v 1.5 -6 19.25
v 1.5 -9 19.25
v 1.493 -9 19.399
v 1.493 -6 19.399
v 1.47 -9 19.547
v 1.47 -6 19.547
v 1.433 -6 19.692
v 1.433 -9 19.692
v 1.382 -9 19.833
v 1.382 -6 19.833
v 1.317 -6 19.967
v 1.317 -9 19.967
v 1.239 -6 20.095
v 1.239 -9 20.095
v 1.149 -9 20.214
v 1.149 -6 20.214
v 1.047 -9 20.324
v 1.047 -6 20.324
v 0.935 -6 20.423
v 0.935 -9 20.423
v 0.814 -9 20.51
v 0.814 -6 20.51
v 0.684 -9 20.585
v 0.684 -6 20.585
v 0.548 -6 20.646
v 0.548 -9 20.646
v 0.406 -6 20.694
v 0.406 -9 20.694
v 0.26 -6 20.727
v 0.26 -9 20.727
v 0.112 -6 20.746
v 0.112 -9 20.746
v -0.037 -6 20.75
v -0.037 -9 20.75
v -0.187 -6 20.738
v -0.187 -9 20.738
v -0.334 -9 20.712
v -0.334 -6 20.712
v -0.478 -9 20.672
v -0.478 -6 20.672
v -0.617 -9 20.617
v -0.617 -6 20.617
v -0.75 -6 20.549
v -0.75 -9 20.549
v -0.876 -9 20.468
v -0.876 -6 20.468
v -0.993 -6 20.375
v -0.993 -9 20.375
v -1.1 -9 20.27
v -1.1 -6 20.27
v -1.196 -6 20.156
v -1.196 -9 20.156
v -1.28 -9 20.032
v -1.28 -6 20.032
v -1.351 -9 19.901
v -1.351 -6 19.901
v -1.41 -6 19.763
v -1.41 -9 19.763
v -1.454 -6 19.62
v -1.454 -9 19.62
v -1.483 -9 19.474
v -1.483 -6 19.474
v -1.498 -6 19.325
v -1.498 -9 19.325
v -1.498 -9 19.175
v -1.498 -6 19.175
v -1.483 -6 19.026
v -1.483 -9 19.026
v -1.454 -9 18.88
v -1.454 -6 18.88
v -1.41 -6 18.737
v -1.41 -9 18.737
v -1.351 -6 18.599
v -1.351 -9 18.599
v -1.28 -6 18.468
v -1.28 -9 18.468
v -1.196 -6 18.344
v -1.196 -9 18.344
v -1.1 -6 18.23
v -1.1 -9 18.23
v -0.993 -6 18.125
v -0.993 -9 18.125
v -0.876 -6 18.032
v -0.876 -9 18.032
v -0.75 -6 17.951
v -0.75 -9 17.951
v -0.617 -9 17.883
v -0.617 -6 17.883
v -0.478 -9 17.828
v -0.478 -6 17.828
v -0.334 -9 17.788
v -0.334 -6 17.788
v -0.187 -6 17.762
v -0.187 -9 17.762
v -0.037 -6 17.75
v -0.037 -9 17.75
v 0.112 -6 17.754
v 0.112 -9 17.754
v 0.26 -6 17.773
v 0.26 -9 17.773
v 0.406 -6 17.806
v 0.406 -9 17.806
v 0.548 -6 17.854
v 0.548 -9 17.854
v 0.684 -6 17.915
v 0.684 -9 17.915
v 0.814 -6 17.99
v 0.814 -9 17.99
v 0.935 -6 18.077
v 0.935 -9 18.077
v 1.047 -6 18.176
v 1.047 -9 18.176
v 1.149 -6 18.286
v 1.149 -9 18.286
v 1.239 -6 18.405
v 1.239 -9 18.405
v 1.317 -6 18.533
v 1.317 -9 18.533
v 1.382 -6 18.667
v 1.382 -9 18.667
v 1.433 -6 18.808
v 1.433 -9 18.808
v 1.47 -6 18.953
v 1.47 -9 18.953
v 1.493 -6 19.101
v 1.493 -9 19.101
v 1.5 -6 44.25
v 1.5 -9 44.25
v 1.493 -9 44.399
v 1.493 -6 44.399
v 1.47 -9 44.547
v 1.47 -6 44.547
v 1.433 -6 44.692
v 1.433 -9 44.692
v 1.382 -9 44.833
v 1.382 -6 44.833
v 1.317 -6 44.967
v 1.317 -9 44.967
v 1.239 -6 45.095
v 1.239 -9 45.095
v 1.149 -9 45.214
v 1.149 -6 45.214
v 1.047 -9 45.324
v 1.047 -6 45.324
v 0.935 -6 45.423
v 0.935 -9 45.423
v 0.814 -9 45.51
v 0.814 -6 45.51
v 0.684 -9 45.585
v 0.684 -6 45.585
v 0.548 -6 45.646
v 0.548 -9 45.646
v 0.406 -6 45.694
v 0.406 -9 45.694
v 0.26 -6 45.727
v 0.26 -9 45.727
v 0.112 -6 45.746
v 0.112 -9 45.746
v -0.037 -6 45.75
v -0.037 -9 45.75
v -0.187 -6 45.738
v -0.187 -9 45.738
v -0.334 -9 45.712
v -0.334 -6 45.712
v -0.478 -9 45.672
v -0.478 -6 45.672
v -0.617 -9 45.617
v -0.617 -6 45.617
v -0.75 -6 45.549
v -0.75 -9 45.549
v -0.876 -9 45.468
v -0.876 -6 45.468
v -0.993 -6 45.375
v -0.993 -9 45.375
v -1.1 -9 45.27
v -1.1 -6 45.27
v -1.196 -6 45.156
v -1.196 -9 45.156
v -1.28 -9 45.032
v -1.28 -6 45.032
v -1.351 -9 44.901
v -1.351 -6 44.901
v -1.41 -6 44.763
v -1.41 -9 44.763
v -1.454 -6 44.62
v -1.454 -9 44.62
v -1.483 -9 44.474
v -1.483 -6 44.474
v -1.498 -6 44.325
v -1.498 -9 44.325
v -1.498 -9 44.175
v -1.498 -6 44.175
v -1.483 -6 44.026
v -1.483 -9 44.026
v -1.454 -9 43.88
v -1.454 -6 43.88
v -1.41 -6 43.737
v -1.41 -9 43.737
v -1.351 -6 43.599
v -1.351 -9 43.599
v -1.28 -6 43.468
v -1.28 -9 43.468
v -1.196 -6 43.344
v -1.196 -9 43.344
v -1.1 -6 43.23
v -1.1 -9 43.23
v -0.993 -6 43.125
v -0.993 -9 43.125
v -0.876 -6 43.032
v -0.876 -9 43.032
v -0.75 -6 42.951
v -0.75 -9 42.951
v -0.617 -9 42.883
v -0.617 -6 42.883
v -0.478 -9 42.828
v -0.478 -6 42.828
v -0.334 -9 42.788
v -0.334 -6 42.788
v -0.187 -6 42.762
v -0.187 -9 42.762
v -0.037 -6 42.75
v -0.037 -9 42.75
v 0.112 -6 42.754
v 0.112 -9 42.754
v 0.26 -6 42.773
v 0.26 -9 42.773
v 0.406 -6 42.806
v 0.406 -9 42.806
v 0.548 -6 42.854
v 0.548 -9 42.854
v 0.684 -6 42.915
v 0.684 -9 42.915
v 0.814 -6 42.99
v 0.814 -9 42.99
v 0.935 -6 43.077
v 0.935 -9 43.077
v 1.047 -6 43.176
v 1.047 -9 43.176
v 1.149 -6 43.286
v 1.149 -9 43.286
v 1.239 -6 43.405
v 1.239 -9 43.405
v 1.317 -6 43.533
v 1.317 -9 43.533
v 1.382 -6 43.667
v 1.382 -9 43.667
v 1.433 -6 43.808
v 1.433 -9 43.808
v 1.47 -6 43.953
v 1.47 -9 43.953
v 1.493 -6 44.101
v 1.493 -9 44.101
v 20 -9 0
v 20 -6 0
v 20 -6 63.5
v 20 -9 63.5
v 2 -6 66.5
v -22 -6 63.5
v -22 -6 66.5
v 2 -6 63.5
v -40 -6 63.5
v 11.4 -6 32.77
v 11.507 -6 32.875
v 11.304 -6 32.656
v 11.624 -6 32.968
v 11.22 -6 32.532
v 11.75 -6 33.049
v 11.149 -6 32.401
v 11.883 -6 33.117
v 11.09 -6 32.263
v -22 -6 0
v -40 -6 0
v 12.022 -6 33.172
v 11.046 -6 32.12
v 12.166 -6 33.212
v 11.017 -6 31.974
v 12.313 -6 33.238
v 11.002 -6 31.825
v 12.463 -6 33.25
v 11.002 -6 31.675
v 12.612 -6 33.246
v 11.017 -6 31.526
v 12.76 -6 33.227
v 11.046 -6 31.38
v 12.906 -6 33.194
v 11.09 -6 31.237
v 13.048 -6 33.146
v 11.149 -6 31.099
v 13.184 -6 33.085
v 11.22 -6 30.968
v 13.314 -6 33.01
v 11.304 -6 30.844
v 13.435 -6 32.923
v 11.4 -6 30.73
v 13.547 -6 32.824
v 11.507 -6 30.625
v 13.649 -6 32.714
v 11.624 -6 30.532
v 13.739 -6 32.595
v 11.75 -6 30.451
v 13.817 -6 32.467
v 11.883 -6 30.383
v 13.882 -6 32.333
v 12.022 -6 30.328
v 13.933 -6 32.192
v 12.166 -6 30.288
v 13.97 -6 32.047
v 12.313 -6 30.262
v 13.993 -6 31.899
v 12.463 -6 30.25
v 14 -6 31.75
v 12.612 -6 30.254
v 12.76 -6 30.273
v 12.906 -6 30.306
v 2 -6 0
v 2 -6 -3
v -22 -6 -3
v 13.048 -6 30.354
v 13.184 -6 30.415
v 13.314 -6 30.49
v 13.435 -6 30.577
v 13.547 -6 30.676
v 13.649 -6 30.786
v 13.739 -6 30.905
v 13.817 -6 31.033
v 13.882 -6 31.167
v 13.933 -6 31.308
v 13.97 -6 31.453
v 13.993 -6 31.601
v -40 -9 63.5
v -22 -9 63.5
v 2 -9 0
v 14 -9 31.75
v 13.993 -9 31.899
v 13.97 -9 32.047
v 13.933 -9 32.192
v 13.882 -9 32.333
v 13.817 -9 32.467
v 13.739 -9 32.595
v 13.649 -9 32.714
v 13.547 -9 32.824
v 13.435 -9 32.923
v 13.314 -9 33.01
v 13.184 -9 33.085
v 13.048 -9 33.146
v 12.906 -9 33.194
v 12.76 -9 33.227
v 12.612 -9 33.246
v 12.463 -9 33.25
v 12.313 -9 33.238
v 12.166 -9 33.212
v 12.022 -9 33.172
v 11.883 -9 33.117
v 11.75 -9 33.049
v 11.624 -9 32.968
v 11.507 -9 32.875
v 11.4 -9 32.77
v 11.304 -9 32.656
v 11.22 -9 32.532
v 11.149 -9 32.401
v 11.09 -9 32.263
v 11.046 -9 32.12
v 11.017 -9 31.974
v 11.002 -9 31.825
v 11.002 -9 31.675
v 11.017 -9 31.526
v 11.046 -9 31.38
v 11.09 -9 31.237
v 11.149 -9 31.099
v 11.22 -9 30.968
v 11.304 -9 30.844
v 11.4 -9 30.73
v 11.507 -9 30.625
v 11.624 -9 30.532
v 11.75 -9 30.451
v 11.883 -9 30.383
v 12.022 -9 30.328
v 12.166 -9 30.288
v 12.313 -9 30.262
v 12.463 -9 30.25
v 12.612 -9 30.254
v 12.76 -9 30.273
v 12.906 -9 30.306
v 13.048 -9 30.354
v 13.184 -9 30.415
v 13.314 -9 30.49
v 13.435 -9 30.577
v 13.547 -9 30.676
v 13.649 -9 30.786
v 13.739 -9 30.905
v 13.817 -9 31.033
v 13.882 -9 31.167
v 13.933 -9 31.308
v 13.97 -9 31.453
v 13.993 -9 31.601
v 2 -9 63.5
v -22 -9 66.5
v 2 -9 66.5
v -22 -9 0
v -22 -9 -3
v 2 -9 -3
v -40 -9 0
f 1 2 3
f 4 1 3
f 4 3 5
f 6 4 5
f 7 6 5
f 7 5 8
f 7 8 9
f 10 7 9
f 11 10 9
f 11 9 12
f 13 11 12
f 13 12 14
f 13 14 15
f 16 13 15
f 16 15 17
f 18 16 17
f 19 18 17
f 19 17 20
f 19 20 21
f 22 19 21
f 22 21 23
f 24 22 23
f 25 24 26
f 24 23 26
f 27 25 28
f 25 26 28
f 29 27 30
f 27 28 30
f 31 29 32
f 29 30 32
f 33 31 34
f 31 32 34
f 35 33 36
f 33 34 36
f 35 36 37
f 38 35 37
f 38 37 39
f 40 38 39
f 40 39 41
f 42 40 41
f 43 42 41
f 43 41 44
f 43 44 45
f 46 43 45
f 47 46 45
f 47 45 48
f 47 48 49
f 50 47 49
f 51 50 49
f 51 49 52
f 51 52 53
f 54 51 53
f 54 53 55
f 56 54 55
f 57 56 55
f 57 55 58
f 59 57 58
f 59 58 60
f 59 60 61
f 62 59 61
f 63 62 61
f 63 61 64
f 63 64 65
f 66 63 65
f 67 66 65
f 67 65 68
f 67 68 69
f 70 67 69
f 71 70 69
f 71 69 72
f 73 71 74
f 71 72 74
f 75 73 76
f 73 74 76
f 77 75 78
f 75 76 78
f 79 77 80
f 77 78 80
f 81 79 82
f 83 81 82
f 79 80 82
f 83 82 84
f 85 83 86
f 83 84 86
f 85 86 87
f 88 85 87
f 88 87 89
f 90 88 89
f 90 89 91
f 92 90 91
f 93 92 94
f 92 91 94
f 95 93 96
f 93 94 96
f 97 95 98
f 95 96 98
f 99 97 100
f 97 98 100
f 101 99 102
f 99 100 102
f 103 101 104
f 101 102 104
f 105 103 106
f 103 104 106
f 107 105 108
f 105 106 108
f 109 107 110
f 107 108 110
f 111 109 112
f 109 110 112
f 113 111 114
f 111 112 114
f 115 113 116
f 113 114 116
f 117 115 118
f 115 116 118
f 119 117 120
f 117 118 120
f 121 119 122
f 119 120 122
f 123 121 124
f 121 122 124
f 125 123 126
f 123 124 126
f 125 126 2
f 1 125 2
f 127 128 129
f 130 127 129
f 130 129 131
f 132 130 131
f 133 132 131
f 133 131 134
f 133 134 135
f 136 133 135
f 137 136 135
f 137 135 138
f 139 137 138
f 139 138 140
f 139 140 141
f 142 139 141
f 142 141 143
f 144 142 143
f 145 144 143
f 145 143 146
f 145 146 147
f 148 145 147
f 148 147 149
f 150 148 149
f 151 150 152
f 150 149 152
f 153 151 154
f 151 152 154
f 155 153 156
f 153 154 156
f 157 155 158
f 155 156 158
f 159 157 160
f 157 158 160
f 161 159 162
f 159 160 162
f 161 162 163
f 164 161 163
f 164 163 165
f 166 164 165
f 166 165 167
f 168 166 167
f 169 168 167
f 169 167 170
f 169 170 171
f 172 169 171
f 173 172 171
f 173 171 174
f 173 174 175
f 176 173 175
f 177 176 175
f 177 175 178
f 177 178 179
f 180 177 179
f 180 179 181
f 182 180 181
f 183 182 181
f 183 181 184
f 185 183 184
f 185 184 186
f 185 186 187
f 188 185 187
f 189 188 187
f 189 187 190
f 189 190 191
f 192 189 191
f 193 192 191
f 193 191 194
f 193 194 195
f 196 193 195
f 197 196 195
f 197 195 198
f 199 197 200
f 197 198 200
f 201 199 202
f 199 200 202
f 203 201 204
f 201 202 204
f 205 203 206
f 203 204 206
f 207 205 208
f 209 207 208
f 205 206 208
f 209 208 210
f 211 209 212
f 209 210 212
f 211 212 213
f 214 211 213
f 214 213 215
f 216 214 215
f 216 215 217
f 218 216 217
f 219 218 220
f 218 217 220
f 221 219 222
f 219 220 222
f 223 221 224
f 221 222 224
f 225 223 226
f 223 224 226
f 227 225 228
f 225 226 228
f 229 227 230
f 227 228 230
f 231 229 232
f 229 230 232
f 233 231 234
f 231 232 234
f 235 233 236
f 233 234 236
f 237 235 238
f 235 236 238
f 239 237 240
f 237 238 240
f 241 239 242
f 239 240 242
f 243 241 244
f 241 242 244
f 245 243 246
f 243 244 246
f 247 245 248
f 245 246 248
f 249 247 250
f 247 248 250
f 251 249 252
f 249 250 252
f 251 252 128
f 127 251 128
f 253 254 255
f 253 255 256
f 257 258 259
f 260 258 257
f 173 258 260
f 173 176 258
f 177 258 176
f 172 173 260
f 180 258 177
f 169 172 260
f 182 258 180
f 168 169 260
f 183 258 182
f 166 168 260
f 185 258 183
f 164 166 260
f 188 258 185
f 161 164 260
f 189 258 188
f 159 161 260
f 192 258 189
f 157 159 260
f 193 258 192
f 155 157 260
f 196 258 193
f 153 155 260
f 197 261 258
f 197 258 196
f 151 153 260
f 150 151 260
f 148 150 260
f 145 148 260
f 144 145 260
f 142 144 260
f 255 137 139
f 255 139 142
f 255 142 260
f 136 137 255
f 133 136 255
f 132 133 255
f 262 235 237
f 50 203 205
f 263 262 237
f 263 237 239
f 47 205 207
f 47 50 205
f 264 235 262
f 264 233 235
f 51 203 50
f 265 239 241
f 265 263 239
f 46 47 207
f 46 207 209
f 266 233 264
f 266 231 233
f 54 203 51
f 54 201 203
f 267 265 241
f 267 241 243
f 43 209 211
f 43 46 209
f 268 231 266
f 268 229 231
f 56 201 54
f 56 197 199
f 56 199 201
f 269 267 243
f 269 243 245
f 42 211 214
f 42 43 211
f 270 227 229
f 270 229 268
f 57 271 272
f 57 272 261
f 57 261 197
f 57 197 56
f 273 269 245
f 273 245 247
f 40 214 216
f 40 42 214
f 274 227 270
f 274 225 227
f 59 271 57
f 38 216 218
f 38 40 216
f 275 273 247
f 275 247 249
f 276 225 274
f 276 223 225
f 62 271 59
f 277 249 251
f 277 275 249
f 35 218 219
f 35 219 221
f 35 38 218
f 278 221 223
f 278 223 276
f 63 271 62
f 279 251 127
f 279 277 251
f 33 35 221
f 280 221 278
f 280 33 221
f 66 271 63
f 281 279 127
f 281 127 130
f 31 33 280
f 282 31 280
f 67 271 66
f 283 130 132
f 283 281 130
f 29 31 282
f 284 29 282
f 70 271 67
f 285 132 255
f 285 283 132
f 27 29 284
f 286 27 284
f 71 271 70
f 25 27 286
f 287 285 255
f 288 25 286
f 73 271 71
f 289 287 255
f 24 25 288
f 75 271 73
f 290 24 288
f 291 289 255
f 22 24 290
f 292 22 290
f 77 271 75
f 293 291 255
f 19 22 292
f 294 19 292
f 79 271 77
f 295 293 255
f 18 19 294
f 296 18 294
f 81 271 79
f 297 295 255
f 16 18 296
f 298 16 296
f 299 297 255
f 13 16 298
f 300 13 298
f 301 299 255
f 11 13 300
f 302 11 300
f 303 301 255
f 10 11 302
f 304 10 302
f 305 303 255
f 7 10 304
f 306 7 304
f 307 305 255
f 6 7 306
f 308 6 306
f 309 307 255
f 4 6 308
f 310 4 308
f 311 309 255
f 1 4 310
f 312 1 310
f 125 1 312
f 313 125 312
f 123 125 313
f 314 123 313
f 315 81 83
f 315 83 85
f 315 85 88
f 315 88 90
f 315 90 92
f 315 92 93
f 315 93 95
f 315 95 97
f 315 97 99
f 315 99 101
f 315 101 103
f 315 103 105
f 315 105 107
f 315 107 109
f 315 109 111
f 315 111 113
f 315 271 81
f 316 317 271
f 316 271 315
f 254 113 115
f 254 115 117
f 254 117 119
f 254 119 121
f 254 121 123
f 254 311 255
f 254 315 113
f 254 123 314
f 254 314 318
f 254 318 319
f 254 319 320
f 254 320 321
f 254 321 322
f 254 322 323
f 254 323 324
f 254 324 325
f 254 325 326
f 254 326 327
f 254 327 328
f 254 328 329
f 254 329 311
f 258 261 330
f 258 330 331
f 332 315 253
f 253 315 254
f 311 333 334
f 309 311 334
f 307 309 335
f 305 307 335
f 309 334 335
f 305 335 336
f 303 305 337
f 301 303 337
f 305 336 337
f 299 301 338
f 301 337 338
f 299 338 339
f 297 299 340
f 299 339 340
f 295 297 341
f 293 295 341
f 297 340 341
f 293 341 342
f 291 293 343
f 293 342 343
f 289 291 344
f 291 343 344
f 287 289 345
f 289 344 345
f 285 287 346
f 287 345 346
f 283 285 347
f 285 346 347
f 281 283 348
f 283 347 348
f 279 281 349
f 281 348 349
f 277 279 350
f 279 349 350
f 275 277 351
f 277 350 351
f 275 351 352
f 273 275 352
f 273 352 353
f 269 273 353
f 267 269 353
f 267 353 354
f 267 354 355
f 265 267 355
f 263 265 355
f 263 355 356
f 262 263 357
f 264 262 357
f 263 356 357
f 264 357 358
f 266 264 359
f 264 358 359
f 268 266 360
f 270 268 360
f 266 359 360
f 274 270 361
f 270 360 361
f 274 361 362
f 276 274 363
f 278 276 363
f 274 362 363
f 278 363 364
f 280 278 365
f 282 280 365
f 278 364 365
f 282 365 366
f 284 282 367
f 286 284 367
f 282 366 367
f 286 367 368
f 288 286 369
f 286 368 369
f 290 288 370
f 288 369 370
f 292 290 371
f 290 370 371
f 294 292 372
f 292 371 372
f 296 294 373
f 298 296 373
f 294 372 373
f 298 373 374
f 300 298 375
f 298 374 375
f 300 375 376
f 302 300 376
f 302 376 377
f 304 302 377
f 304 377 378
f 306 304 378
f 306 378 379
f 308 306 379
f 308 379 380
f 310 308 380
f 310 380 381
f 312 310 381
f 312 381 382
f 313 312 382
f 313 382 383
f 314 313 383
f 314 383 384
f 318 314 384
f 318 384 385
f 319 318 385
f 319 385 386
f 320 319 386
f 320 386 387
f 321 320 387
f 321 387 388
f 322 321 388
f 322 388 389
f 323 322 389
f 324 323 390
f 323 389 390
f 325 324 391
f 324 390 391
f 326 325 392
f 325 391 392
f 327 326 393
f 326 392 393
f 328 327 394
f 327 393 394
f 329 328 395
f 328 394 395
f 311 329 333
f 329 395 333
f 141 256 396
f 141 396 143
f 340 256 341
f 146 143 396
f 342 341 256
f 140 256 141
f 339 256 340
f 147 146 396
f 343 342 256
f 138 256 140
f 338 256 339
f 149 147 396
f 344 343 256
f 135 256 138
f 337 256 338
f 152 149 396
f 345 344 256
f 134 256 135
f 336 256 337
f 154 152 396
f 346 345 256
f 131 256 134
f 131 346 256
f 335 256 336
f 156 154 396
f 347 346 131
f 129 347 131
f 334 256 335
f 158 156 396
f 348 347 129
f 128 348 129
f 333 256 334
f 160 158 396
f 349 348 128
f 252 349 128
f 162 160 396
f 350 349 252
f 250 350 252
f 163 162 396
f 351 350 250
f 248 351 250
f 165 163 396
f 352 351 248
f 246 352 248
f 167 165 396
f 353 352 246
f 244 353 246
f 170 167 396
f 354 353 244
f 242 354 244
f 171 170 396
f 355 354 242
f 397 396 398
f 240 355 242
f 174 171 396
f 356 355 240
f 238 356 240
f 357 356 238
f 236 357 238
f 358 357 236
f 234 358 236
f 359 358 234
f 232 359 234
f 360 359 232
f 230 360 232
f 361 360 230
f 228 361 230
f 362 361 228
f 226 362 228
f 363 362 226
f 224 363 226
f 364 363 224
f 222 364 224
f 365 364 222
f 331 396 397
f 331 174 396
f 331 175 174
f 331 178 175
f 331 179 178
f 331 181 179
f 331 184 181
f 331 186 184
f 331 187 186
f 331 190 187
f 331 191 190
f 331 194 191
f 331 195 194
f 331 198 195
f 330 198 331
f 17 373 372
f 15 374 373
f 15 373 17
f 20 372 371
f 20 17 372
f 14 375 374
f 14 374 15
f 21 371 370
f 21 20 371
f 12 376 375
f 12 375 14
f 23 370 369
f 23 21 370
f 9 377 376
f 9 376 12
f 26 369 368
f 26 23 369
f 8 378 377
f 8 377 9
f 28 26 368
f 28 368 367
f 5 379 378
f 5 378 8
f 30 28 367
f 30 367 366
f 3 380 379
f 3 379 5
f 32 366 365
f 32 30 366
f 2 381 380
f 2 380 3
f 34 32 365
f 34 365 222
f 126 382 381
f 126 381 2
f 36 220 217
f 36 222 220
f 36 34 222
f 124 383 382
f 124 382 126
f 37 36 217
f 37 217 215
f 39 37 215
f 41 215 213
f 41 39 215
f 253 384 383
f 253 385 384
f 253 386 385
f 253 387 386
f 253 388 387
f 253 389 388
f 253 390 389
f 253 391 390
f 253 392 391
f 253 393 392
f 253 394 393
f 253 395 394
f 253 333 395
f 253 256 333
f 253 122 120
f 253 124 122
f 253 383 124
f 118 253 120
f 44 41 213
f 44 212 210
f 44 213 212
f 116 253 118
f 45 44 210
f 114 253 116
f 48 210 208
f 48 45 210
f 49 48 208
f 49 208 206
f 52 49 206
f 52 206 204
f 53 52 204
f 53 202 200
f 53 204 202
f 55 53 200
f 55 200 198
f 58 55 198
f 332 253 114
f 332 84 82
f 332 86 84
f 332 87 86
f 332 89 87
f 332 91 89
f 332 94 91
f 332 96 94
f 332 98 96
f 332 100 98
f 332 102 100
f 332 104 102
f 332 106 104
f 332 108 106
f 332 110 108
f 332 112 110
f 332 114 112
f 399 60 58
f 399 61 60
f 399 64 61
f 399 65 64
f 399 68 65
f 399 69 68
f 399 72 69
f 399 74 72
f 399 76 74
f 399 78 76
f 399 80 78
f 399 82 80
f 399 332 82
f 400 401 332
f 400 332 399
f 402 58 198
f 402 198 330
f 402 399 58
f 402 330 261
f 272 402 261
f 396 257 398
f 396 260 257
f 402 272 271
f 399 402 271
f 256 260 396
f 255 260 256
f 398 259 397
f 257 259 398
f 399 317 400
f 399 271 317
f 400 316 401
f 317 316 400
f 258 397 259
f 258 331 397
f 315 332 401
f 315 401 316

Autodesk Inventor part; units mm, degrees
ref_plane "YZ Plane" through (0, 0, 0) normal (1, 0, 0) x (0, 1, 0)
ref_plane "XZ Plane" through (0, 0, 0) normal (0, 1, 0) x (-1, 0, 0)
ref_plane "XY Plane" through (0, 0, 0) normal (0, 0, 1) x (1, 0, 0)
sketch "Sketch1" plane through (0, 0, 0) normal (0, 0, 1) x (1, 0, 0)
  line L0 (2, -6) -> (2, -9) construction
  line L1 (-22, -9) -> (-22, -6) construction
  line L2 (20, -40) -> (20, -3) construction
  line L3 (-40, -3) -> (-40, -40) construction
  line L4 (20, -9) -> (-40, -9)
  line L5 (-40, -9) -> (-40, -6)
  line L6 (-40, -6) -> (20, -6)
  line L7 (20, -6) -> (20, -9)
  point P0 (0, 0)
  dimension "d0" = 3
  dimension "d1" = 60
extrude "Extrusion1" add sketch "Sketch1" along normal blind 63.5
sketch "Sketch2" plane through (0, 0, 63.5) normal (0, 0, 1) x (1, 0, 0)
  line L0 (-22, -9) -> (-22, -6) projected
  line L1 (2, -9) -> (-22, -9) projected
  line L2 (-22, -6) -> (2, -6) projected
  line L3 (2, -6) -> (2, -9) projected
  point P0 (0, 0)
extrude "Extrusion2" add sketch "Sketch2" along normal blind 3
ref_plane "Work Plane1" through (0, 0, 31.75) normal (0, 0, 1) x (1, 0, 0)
mirror "Mirror1" about plane through (0, 0, 31.75) normal (0, 0, 1) of "Extrusion2"
sketch "Sketch3" plane through (20, -9, 0) normal (0, -1, 0) x (1, 0, 0)
  circle A0 centre (-7.5, 31.75) radius 1.5 projected
  circle A1 centre (-20, 44.25) radius 1.5 projected
  circle A2 centre (-20, 19.25) radius 1.5 projected
  point P0 (-20, 0)
extrude "Extrusion3" cut sketch "Sketch3" against normal blind 3
properties part number "Pan base cross bar"
